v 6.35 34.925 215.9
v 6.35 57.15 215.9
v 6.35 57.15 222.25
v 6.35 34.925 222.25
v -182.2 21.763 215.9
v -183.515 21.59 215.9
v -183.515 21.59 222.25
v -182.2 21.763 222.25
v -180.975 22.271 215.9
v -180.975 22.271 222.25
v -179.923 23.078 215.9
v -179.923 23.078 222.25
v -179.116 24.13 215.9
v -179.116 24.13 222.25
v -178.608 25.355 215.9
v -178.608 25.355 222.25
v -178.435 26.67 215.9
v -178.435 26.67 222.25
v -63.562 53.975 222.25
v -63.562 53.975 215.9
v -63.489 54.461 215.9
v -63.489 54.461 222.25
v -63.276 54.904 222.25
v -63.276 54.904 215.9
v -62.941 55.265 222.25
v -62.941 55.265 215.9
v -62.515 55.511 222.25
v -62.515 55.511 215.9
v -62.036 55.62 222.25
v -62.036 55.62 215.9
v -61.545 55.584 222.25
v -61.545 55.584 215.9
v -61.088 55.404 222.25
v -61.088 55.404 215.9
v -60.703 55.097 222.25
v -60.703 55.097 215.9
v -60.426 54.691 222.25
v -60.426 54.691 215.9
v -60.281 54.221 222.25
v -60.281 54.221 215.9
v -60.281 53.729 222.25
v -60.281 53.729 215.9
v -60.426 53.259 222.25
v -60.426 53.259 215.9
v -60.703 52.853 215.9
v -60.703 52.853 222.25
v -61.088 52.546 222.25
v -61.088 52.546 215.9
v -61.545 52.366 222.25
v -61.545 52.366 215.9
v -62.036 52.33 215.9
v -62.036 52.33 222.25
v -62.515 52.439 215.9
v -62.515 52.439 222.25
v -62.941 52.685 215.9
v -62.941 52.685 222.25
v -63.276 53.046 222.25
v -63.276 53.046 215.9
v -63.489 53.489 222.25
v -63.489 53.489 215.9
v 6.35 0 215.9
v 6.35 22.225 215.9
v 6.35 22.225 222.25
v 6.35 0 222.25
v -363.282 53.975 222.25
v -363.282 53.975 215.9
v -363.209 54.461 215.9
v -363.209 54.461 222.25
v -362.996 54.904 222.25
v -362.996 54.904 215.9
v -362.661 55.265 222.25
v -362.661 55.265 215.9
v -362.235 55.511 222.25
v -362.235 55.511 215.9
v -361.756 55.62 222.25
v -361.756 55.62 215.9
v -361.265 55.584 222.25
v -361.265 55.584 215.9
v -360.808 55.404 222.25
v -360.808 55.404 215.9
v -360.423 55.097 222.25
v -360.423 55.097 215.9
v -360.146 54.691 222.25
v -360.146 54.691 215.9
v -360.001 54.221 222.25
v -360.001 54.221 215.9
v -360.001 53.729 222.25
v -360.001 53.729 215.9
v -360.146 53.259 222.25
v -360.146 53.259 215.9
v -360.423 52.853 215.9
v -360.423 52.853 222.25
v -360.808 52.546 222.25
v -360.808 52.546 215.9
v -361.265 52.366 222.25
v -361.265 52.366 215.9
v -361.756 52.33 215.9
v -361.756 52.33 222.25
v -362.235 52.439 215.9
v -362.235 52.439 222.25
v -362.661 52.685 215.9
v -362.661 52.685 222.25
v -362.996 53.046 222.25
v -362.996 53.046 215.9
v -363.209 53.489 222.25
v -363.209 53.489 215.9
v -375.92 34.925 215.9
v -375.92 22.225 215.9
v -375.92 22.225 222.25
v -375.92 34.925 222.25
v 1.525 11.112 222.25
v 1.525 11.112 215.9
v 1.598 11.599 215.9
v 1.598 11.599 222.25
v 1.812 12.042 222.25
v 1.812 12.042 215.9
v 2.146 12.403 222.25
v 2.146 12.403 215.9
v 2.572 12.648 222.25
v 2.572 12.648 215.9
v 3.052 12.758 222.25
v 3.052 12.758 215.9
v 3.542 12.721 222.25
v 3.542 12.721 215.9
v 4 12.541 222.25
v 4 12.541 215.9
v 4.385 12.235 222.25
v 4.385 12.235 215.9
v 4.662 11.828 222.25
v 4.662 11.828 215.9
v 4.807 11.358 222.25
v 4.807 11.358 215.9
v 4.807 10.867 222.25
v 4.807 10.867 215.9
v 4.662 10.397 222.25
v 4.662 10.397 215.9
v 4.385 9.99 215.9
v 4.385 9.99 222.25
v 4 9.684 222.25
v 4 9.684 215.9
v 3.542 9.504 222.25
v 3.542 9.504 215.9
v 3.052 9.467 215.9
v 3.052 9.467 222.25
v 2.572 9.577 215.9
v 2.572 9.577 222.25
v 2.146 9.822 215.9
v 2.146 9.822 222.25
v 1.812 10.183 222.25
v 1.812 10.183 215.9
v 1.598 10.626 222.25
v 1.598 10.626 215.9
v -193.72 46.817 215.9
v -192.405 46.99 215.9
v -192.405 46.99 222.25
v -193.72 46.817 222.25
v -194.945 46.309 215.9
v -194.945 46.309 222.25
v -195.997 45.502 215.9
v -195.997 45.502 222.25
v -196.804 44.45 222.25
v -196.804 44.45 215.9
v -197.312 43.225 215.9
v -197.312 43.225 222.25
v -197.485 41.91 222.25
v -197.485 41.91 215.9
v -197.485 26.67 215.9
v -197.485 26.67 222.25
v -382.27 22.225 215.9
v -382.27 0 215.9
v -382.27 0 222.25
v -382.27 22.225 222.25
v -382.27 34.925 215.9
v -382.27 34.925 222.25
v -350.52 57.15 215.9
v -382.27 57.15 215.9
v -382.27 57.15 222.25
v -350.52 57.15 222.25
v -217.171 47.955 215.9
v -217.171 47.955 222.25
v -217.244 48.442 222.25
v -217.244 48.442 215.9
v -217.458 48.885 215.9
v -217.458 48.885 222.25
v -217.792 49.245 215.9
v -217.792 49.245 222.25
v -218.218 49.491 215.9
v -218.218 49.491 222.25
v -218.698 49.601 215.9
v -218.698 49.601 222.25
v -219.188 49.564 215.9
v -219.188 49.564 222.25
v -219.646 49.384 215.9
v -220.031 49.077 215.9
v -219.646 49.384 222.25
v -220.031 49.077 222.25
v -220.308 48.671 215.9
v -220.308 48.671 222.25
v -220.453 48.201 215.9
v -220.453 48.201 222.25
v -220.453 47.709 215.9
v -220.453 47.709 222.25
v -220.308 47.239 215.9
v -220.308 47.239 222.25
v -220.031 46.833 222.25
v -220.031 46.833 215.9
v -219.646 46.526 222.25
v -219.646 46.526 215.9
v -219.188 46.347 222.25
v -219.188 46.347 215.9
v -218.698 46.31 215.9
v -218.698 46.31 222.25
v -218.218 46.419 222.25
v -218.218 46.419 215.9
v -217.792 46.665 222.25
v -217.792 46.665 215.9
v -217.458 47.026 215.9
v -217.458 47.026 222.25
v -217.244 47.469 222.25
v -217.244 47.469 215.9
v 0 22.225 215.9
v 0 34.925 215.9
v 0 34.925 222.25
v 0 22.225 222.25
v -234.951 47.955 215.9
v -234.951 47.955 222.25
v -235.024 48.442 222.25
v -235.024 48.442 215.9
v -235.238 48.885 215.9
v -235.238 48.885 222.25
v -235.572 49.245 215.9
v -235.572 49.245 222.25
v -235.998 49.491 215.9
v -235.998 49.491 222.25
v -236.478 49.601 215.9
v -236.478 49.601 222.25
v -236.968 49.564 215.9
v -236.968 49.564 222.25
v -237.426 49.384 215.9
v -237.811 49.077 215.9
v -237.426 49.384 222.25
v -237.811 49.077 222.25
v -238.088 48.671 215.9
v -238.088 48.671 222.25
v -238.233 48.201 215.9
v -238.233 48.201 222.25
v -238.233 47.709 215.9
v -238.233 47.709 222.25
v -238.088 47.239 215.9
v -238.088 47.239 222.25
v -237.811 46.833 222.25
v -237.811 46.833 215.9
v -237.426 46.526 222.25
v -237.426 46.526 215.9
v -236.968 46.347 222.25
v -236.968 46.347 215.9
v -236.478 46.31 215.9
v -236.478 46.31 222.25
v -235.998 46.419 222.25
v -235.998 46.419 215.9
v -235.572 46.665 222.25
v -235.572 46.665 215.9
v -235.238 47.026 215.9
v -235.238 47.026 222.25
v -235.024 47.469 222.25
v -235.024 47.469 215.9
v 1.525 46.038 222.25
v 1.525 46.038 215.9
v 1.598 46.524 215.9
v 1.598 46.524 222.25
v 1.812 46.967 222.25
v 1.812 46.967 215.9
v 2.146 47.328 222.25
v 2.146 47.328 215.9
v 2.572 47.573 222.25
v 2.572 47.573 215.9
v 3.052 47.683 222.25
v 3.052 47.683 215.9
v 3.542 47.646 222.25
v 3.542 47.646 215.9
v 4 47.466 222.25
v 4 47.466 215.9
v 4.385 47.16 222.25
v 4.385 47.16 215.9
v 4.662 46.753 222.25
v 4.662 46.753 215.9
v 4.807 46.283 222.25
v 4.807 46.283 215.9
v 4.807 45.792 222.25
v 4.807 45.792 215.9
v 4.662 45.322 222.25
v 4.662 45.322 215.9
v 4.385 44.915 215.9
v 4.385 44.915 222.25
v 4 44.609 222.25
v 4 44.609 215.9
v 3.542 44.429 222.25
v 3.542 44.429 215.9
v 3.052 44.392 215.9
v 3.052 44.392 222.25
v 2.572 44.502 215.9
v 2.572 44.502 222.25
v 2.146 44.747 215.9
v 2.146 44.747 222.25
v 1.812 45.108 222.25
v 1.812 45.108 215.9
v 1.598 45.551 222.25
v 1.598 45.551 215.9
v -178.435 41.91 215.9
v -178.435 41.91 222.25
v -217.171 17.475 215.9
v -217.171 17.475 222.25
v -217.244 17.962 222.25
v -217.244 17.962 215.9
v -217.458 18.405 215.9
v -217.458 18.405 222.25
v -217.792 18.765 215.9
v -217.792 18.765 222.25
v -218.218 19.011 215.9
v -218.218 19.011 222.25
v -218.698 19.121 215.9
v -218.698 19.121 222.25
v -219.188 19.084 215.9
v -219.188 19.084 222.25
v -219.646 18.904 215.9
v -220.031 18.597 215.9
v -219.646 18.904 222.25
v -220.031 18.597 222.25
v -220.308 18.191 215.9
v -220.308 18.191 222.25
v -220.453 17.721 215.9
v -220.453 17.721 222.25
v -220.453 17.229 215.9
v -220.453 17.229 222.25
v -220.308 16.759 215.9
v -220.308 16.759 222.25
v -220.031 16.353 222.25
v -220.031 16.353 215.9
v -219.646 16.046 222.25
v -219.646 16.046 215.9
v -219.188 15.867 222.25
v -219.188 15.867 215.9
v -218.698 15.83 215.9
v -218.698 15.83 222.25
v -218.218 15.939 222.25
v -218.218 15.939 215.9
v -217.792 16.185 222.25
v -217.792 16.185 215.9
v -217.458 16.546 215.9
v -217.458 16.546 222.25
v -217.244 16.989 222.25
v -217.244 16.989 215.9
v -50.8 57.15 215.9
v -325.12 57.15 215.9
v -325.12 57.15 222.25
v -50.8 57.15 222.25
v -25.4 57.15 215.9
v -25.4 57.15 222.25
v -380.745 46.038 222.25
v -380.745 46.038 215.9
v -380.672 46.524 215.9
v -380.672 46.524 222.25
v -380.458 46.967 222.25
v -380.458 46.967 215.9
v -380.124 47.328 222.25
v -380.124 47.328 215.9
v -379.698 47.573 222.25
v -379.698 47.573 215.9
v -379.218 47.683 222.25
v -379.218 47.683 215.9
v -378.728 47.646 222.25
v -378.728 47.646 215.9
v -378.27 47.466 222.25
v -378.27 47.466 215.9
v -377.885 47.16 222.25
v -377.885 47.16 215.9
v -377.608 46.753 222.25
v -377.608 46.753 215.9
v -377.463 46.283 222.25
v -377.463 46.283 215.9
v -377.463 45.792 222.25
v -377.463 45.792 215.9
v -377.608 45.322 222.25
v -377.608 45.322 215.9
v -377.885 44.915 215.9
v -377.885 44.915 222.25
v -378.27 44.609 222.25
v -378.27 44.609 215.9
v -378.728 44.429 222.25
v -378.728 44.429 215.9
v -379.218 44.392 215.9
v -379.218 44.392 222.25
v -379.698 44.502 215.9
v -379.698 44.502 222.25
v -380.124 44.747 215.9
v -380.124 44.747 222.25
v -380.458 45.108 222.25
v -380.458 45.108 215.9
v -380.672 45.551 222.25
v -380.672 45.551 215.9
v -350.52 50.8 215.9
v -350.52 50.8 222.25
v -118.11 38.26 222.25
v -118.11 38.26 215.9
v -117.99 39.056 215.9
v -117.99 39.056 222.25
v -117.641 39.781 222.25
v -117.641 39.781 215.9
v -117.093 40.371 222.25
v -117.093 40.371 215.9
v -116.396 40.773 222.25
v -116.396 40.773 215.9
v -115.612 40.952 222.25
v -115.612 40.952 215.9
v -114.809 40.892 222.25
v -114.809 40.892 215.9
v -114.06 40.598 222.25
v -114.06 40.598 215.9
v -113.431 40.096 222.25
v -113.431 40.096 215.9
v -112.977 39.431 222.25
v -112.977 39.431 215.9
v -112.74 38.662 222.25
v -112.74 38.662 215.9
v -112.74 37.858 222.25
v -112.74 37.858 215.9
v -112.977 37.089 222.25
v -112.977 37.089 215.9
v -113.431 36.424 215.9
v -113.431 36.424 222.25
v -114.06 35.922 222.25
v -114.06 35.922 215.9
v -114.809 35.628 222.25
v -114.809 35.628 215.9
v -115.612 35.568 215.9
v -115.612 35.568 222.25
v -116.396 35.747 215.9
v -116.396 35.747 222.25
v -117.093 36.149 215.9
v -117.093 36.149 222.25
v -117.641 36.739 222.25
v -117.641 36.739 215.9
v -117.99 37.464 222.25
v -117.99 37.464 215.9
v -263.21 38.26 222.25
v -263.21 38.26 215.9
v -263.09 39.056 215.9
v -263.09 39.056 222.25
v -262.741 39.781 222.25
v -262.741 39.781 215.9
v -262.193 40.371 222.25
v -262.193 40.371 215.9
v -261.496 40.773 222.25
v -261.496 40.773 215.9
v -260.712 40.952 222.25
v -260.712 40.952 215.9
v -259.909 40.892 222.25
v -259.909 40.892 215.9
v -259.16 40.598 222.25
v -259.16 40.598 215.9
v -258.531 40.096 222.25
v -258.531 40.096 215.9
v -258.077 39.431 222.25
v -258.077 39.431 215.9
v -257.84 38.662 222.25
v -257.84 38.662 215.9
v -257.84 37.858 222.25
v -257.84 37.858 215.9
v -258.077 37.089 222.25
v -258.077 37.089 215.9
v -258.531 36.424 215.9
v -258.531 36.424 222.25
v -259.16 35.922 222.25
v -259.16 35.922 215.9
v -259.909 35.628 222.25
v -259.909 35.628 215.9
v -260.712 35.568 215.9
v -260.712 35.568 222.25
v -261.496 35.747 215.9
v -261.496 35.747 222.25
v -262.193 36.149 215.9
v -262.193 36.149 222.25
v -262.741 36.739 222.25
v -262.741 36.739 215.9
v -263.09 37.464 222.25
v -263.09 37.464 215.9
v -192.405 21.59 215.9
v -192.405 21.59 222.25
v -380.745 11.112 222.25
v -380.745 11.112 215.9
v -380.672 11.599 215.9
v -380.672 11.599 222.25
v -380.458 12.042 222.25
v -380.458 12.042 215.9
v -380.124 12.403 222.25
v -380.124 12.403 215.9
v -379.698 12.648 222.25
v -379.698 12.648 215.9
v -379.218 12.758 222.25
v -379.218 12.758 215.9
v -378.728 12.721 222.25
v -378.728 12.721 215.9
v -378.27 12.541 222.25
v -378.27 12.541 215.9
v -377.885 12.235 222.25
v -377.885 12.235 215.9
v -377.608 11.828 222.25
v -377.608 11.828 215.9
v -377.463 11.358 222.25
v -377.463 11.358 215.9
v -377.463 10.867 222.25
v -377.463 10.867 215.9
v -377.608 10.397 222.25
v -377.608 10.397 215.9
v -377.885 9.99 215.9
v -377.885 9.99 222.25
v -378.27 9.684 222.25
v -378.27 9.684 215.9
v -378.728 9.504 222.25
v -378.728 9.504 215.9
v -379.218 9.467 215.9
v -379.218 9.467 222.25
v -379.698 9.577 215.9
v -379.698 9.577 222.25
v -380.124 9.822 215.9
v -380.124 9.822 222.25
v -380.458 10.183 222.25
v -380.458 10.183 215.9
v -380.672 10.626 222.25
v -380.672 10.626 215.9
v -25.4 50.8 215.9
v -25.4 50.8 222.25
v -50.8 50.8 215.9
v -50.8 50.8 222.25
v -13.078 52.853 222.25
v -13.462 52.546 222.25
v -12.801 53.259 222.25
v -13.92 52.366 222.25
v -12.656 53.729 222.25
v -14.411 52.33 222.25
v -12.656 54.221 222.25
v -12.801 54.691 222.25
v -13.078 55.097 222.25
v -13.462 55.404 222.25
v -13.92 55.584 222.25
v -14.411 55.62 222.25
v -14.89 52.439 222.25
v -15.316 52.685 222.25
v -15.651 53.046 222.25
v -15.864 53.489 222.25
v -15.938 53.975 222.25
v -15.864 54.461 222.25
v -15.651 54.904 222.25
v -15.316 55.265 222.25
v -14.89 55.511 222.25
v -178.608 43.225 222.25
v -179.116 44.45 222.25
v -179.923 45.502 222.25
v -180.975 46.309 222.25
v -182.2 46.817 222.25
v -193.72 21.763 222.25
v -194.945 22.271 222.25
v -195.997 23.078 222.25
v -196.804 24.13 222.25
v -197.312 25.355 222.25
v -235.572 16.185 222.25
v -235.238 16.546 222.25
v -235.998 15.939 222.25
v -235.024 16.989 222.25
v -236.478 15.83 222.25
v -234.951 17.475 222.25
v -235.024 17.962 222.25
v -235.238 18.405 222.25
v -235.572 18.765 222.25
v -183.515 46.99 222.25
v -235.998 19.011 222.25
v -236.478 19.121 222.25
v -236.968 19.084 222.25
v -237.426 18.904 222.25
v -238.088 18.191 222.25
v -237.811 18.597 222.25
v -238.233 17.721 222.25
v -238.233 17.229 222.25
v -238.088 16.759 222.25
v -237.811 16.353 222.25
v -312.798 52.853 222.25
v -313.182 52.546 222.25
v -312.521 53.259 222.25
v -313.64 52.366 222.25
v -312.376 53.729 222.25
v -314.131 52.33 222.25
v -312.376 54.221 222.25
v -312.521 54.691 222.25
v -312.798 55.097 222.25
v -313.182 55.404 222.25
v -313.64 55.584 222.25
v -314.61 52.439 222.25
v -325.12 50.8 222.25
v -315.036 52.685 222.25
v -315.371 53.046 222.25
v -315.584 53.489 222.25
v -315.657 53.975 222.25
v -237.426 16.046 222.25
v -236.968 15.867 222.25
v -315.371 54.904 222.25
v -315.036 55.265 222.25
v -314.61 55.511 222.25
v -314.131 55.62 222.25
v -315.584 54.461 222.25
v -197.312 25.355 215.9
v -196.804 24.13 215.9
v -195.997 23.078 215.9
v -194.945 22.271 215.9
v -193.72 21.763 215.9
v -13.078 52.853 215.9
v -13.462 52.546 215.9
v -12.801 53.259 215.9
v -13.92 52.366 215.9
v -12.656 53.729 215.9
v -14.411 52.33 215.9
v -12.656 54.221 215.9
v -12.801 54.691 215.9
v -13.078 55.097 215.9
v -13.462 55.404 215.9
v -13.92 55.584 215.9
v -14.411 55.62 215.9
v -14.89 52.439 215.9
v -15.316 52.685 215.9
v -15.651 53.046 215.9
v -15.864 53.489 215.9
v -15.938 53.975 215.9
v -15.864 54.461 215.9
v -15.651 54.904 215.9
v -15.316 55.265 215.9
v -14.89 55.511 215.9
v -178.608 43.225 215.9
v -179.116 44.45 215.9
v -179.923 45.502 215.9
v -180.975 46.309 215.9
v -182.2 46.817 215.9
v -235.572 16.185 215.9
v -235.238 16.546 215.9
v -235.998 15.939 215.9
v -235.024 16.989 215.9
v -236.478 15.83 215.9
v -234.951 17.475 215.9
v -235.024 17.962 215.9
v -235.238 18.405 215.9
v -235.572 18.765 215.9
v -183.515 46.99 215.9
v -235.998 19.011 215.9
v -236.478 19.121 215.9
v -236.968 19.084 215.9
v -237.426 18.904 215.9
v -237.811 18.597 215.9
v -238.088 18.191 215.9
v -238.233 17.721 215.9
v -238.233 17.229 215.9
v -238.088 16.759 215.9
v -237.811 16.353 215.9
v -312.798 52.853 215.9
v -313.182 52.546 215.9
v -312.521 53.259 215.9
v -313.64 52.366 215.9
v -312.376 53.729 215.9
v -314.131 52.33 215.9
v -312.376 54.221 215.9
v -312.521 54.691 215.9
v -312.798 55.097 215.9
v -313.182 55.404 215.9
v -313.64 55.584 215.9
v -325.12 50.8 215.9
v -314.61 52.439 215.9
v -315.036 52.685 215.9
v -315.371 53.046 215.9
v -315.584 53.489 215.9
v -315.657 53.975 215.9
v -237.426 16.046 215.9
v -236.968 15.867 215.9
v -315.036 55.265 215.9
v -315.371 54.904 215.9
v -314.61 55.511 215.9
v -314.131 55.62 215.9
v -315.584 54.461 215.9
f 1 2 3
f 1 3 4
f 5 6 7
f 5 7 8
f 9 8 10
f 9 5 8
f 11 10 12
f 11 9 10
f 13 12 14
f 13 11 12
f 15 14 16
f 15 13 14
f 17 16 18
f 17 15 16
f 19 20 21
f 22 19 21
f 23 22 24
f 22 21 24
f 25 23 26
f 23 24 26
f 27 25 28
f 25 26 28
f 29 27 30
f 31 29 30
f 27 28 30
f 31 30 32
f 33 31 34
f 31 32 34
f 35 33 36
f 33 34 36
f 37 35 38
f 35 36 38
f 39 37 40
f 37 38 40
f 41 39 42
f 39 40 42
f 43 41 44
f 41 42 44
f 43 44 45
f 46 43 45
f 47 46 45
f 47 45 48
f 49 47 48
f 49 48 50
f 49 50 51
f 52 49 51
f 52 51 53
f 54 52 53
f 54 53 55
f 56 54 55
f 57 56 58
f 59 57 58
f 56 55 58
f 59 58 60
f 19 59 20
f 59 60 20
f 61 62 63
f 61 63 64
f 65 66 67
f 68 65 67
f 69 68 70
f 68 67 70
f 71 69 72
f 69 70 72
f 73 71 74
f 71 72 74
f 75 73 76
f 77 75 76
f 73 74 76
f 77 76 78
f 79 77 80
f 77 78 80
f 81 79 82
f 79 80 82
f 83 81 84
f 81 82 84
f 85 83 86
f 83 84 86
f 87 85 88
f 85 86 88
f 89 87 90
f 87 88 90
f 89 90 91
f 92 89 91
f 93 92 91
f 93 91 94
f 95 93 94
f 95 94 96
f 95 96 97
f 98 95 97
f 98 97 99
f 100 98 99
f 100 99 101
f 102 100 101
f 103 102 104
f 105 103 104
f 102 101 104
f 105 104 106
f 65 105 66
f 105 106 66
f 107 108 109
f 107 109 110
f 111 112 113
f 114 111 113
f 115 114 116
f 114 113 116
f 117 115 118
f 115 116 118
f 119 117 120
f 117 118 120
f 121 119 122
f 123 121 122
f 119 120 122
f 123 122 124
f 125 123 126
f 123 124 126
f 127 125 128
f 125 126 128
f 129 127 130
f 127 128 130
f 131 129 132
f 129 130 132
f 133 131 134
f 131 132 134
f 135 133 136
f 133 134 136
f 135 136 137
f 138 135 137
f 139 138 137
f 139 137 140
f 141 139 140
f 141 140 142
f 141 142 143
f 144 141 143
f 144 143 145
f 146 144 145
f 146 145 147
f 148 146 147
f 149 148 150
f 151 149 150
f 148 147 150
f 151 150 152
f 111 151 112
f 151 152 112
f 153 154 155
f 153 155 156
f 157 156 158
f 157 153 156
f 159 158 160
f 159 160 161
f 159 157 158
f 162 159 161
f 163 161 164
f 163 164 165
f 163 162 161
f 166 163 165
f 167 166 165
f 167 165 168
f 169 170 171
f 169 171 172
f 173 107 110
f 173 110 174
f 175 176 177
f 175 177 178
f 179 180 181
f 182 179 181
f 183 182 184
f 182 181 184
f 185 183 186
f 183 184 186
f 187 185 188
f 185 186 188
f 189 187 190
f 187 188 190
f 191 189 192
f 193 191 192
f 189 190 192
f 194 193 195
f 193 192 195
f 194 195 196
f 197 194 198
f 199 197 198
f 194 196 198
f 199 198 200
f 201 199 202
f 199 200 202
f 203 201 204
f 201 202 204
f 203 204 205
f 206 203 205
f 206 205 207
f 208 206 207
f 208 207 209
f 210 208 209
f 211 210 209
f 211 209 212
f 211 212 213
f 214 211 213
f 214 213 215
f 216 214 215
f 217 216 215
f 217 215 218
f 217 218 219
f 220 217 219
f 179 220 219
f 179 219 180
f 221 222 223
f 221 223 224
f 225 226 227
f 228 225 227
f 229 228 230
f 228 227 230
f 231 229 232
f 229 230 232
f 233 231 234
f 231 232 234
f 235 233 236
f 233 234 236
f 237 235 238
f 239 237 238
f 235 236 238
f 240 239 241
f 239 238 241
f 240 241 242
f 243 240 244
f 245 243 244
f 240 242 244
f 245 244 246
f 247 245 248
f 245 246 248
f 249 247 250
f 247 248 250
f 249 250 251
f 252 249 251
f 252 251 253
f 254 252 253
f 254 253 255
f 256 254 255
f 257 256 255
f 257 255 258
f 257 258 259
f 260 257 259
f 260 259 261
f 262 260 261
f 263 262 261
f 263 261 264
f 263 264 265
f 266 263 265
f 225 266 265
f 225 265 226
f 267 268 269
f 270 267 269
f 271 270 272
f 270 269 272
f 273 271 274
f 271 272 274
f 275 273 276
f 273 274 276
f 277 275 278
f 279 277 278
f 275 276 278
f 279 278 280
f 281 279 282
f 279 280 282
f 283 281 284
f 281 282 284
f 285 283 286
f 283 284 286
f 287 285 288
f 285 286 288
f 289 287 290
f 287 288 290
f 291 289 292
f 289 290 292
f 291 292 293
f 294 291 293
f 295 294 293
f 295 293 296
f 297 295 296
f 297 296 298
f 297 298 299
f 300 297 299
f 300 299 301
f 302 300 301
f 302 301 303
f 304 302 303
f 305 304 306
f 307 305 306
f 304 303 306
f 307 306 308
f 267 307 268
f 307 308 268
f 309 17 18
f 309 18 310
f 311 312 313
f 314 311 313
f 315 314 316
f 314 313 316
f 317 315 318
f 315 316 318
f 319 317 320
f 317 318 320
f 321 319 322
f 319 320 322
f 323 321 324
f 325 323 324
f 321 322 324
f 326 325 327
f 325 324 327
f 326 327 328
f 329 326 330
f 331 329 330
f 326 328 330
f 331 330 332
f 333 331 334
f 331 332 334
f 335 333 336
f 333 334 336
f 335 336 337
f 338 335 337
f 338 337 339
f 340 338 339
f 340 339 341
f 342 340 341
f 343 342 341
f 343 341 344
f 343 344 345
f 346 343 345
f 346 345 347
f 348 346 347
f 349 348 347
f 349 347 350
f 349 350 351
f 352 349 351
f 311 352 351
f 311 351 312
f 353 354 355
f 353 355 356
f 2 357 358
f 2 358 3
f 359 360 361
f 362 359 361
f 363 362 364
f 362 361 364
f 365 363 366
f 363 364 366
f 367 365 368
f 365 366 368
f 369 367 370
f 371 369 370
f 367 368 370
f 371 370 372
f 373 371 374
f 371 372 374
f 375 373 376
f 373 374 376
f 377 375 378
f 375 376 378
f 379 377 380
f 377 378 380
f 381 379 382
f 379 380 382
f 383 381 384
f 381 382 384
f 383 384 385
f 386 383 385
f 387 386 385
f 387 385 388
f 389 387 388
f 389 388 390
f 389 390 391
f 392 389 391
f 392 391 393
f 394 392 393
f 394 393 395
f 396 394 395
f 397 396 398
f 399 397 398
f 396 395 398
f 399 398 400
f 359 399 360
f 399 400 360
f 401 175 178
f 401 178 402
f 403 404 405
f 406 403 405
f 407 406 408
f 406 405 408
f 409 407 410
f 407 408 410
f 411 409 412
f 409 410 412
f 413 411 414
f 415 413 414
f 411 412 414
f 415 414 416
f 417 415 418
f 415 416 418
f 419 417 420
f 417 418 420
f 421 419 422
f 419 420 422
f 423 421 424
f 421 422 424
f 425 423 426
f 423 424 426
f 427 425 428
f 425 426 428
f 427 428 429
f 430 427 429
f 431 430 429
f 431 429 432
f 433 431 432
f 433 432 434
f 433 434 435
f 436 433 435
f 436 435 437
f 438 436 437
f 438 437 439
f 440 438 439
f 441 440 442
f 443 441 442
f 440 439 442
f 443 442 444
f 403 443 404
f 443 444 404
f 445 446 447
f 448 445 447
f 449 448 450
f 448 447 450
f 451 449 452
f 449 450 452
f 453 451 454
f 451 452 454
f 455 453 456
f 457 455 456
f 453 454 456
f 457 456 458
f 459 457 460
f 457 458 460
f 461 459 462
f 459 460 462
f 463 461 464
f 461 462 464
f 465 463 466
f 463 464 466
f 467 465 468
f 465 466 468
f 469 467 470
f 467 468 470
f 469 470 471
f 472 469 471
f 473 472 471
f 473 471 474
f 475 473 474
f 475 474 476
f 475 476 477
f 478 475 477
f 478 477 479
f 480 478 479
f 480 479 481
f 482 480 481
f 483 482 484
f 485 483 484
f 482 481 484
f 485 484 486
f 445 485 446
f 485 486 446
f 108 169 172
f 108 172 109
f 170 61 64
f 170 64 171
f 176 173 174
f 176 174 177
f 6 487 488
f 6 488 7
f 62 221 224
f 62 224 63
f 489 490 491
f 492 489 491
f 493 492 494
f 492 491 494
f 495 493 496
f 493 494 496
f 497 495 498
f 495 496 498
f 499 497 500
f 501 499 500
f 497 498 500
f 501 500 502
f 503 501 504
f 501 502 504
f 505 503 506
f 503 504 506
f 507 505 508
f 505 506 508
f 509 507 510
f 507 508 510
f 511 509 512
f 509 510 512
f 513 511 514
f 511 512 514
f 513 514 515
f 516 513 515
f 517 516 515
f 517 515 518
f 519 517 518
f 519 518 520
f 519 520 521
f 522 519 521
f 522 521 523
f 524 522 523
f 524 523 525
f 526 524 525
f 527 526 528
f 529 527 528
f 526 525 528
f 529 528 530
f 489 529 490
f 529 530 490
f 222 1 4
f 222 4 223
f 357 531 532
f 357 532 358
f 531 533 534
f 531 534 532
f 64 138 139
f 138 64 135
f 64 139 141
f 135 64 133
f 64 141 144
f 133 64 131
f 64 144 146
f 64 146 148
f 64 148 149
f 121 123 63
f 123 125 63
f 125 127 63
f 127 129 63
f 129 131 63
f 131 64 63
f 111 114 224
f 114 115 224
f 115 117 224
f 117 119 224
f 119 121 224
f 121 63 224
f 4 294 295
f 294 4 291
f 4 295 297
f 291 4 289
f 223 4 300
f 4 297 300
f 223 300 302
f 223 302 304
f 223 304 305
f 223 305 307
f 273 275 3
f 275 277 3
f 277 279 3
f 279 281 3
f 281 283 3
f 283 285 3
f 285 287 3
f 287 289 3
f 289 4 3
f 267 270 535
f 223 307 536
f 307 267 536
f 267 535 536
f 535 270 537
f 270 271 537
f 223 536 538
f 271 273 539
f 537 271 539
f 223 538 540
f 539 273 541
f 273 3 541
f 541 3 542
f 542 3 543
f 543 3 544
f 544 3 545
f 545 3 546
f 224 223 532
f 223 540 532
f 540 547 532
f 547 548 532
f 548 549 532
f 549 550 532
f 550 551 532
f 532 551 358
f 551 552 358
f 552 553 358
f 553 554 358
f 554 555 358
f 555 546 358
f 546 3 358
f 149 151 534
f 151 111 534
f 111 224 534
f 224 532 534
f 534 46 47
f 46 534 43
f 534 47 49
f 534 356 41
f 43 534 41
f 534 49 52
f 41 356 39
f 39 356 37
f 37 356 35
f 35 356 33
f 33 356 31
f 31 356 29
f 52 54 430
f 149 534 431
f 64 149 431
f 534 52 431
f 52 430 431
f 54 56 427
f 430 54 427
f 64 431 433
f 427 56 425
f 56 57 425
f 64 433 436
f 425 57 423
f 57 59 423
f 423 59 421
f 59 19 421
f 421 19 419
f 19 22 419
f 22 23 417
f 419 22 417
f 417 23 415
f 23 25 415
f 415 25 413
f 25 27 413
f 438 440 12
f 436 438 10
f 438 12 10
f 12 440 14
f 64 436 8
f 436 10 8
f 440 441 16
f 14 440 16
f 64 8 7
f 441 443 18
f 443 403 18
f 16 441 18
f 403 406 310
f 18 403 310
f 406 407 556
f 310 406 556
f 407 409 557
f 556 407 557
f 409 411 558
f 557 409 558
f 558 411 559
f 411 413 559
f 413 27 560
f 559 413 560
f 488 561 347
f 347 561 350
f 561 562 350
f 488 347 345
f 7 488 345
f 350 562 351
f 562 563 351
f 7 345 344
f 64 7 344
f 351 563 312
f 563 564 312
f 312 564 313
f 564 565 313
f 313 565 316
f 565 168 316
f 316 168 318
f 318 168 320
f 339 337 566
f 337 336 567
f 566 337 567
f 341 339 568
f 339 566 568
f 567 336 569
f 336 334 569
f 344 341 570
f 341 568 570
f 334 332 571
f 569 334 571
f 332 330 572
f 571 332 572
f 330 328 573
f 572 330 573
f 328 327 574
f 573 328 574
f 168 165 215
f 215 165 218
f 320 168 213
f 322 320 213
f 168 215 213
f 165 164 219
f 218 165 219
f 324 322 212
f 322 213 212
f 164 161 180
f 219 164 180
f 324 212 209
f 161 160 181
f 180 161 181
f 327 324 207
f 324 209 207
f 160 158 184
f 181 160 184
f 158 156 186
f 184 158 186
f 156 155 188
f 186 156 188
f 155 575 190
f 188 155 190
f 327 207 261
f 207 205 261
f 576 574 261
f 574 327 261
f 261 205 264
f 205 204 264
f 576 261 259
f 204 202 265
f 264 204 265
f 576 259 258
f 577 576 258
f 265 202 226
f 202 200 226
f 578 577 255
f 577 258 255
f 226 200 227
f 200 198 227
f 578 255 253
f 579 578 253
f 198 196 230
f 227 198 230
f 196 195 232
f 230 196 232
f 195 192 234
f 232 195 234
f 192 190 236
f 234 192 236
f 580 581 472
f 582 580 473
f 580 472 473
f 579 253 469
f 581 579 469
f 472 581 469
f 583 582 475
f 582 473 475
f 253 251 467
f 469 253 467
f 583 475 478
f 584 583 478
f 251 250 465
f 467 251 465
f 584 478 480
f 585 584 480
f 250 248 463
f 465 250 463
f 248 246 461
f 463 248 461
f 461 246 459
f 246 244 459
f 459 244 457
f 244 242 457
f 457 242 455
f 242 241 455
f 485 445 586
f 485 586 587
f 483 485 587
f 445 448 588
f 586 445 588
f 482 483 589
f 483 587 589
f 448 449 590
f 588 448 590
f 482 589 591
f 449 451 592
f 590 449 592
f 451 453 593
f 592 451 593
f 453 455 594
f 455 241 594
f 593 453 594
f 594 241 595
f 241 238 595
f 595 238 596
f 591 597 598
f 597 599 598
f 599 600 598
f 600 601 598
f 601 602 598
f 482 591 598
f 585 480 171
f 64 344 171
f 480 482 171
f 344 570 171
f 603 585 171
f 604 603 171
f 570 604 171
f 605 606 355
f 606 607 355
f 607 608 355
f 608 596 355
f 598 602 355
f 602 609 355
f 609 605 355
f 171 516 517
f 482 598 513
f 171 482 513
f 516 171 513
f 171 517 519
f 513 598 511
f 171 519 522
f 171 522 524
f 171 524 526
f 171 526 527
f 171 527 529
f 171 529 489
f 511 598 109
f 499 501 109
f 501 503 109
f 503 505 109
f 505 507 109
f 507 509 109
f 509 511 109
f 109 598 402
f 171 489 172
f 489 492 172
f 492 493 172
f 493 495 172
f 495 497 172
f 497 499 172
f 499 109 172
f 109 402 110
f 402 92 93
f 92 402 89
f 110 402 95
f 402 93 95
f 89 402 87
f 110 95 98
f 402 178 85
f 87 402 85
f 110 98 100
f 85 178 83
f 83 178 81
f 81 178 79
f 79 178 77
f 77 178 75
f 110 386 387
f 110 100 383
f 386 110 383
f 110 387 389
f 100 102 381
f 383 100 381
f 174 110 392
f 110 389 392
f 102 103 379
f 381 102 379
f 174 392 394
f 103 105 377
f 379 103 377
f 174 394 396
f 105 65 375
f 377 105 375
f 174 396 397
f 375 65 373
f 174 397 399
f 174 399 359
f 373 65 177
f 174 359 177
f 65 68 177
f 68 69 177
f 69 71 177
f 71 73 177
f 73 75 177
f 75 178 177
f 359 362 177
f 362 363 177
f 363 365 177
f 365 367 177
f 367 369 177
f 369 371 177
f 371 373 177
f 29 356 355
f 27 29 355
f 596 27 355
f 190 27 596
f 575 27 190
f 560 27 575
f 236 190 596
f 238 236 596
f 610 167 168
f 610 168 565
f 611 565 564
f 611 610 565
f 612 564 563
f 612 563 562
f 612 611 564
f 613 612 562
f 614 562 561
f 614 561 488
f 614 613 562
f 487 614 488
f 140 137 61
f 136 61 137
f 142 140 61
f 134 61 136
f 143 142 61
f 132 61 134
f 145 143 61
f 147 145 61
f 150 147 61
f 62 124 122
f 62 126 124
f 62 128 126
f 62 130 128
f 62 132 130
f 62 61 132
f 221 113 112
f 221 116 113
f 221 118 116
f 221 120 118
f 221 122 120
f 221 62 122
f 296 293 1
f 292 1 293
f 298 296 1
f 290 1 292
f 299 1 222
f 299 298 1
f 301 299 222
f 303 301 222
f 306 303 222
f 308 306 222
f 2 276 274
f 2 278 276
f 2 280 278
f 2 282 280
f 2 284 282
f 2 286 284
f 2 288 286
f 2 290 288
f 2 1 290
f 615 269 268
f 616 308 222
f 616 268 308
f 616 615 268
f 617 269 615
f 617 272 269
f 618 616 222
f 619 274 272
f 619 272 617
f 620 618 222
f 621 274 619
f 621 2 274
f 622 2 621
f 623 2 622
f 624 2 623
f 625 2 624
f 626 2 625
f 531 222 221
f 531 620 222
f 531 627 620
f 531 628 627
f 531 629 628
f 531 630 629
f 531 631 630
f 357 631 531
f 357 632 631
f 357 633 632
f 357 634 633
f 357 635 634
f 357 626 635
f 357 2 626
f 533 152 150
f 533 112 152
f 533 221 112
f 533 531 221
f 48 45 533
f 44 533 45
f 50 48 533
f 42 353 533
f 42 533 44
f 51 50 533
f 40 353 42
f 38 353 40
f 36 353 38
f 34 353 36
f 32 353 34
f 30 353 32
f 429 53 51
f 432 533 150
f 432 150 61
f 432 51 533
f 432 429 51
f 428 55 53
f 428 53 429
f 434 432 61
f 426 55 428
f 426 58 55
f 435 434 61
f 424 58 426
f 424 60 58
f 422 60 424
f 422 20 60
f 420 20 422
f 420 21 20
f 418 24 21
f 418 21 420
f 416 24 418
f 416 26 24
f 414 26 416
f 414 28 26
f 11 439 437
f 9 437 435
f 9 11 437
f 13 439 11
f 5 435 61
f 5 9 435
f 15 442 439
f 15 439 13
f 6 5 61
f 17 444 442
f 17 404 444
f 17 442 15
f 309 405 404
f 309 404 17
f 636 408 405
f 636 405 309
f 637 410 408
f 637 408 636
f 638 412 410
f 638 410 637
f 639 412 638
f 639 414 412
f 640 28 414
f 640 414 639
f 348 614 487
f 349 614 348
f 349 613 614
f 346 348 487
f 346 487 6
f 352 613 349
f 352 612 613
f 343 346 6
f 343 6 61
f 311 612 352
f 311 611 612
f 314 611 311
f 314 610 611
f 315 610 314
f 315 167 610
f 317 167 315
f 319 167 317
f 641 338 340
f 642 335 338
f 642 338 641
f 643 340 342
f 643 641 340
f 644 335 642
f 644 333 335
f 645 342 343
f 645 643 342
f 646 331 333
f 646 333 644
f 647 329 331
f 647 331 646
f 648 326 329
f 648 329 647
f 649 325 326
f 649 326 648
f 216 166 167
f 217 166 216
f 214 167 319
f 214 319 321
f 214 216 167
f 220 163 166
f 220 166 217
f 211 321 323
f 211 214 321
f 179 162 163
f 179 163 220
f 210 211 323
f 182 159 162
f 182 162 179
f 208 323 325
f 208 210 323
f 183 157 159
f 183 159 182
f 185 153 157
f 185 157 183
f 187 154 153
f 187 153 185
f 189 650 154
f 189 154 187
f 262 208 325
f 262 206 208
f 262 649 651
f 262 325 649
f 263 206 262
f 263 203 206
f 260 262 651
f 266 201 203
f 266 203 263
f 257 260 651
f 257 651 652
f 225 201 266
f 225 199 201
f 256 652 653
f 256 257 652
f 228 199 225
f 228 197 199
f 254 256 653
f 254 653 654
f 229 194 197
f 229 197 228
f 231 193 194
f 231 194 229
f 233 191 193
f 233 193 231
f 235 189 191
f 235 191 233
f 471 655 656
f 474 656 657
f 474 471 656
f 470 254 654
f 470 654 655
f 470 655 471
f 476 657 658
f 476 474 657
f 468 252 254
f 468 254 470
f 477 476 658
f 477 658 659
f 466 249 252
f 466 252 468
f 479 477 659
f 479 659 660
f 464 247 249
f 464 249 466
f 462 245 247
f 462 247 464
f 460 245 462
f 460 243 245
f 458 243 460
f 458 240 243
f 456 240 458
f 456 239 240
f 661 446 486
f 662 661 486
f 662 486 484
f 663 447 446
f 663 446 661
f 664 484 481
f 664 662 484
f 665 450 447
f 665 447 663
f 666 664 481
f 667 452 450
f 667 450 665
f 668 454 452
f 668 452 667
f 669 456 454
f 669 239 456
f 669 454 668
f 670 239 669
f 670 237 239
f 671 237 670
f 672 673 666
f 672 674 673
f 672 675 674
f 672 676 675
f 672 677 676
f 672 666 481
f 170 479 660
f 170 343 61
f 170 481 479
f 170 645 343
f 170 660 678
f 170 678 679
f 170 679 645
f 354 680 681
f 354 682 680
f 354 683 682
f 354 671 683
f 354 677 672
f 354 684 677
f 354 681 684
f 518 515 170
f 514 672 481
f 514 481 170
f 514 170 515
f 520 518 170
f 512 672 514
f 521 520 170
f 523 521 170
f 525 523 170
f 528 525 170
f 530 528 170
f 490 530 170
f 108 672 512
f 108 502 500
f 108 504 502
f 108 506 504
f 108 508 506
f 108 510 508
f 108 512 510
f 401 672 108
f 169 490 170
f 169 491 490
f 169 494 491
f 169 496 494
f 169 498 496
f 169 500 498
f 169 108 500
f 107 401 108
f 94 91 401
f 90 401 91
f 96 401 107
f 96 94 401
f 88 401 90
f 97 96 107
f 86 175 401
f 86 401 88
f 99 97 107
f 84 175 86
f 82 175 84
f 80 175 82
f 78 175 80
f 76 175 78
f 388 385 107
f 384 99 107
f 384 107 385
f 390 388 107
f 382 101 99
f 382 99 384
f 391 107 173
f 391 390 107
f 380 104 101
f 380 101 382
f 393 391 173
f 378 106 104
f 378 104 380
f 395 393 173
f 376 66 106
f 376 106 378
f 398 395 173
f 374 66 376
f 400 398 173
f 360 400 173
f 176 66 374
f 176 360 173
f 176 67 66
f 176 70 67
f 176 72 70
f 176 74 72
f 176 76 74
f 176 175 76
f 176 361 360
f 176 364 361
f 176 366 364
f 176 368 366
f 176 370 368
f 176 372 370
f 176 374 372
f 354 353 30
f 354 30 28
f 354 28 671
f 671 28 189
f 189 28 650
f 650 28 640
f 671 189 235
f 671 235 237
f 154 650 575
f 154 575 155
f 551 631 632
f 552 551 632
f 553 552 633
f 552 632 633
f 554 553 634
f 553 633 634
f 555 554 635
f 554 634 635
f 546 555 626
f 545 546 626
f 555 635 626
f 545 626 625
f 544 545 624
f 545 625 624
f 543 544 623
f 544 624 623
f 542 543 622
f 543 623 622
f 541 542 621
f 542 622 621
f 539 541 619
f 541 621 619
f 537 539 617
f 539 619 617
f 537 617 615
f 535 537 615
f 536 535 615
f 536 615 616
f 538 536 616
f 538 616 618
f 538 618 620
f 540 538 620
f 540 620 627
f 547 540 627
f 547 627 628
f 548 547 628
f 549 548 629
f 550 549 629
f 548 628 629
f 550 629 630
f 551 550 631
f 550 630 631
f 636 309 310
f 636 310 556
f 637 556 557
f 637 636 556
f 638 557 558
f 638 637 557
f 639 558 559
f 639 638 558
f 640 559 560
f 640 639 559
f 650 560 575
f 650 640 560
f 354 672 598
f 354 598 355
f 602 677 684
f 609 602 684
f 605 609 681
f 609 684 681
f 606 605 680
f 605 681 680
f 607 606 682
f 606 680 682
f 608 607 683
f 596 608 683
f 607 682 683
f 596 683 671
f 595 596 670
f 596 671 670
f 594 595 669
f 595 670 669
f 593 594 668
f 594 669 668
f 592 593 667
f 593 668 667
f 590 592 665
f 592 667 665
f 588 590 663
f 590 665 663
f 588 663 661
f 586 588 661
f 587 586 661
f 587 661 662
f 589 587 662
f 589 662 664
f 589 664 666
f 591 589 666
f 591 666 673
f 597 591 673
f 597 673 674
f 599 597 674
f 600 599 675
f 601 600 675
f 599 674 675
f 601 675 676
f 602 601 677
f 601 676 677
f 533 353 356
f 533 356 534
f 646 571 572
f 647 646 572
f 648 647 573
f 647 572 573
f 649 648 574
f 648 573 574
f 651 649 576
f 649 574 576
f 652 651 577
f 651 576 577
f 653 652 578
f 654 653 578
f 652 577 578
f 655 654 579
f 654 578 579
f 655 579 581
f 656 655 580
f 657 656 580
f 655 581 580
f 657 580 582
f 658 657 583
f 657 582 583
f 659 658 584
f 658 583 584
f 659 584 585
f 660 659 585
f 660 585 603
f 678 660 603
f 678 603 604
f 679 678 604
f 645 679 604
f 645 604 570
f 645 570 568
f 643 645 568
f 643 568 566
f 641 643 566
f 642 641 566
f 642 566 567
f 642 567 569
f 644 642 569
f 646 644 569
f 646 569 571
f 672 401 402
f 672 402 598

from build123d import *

# Parameters (mm, degrees)
SKETCH1_R           = 1.65
SKETCH1_R_2         = 2.7
BOSS_EXTRUDE1_DEPTH = 6.35
CUT_EXTRUDE1_REACH  = 8.35
SKETCH2_R           = 1.65


with BuildPart() as part:
    # Sketch1 → Boss-Extrude1 (new body)
    with BuildSketch(Plane(origin=(0, 0, 215.9), x_dir=(-1, 0, 0), z_dir=(0, 0, -1))):
        Polygon((50.8, 57.15), (50.8, 50.8), (25.4, 50.8), (25.4, 57.15), (-6.35, 57.15), (-6.35, 34.925), (0, 34.925), (0, 22.225), (-6.35, 22.225), (-6.35, 0), (382.27, 0), (382.27, 22.225), (375.92, 22.225), (375.92, 34.925), (382.27, 34.925), (382.27, 57.15), (350.52, 57.15), (350.52, 50.8), (325.12, 50.8), (325.12, 57.15), align=None)
        with Locations((379.095, 11.1125)):
            Circle(SKETCH1_R, mode=Mode.SUBTRACT)
        with Locations((-3.175, 11.1125)):
            Circle(SKETCH1_R, mode=Mode.SUBTRACT)
        with Locations((379.095, 46.037500912)):
            Circle(SKETCH1_R, mode=Mode.SUBTRACT)
        with Locations((-3.175, 46.037500912)):
            Circle(SKETCH1_R, mode=Mode.SUBTRACT)
        with Locations((314.0075, 53.975)):
            Circle(SKETCH1_R, mode=Mode.SUBTRACT)
        with Locations((61.9125, 53.975)):
            Circle(SKETCH1_R, mode=Mode.SUBTRACT)
        with Locations((361.6325, 53.975)):
            Circle(SKETCH1_R, mode=Mode.SUBTRACT)
        with Locations((14.2875, 53.975)):
            Circle(SKETCH1_R, mode=Mode.SUBTRACT)
        with Locations((260.51, 38.26)):
            Circle(SKETCH1_R_2, mode=Mode.SUBTRACT)
        with Locations((115.41, 38.26)):
            Circle(SKETCH1_R_2, mode=Mode.SUBTRACT)
        with BuildLine():
            Line((192.405, 21.59), (183.515, 21.59))
            ThreePointArc((183.515, 21.59), (179.922897552, 23.077897552), (178.435, 26.67))
            Line((178.435, 26.67), (178.435, 41.91))
            ThreePointArc((178.435, 41.91), (179.922897552, 45.502102448), (183.515, 46.99))
            Line((183.515, 46.99), (192.405, 46.99))
            ThreePointArc((192.405, 46.99), (195.997102448, 45.502102448), (197.485, 41.91))
            Line((197.485, 41.91), (197.485, 26.67))
            ThreePointArc((197.485, 26.67), (195.997102448, 23.077897552), (192.405, 21.59))
        make_face(mode=Mode.SUBTRACT)
    extrude(amount=-BOSS_EXTRUDE1_DEPTH)

    # Sketch2 → Cut-Extrude1 (cut, up to next)
    with BuildSketch(Plane.XY.offset(222.25), mode=Mode.PRIVATE) as cut_extrude1_sk1:
        with Locations((-218.821, 47.9552)):
            Circle(SKETCH2_R)
    cut_extrude1_tool1 = extrude(cut_extrude1_sk1.sketch, amount=-CUT_EXTRUDE1_REACH, mode=Mode.PRIVATE) & part.part
    add(cut_extrude1_tool1.solids().sort_by_distance((-218.821, 47.9552, 222.25))[0], mode=Mode.SUBTRACT)
    # Sketch2 → Cut-Extrude1 (cut, up to next)
    with BuildSketch(Plane.XY.offset(222.25), mode=Mode.PRIVATE) as cut_extrude1_sk2:
        with Locations((-236.601, 47.9552)):
            Circle(SKETCH2_R)
    cut_extrude1_tool2 = extrude(cut_extrude1_sk2.sketch, amount=-CUT_EXTRUDE1_REACH, mode=Mode.PRIVATE) & part.part
    add(cut_extrude1_tool2.solids().sort_by_distance((-236.601, 47.9552, 222.25))[0], mode=Mode.SUBTRACT)
    # Sketch2 → Cut-Extrude1 (cut, up to next)
    with BuildSketch(Plane.XY.offset(222.25), mode=Mode.PRIVATE) as cut_extrude1_sk3:
        with Locations((-236.601, 17.4752)):
            Circle(SKETCH2_R)
    cut_extrude1_tool3 = extrude(cut_extrude1_sk3.sketch, amount=-CUT_EXTRUDE1_REACH, mode=Mode.PRIVATE) & part.part
    add(cut_extrude1_tool3.solids().sort_by_distance((-236.601, 17.4752, 222.25))[0], mode=Mode.SUBTRACT)
    # Sketch2 → Cut-Extrude1 (cut, up to next)
    with BuildSketch(Plane.XY.offset(222.25), mode=Mode.PRIVATE) as cut_extrude1_sk4:
        with Locations((-218.821, 17.4752)):
            Circle(SKETCH2_R)
    cut_extrude1_tool4 = extrude(cut_extrude1_sk4.sketch, amount=-CUT_EXTRUDE1_REACH, mode=Mode.PRIVATE) & part.part
    add(cut_extrude1_tool4.solids().sort_by_distance((-218.821, 17.4752, 222.25))[0], mode=Mode.SUBTRACT)


solid = part.part
